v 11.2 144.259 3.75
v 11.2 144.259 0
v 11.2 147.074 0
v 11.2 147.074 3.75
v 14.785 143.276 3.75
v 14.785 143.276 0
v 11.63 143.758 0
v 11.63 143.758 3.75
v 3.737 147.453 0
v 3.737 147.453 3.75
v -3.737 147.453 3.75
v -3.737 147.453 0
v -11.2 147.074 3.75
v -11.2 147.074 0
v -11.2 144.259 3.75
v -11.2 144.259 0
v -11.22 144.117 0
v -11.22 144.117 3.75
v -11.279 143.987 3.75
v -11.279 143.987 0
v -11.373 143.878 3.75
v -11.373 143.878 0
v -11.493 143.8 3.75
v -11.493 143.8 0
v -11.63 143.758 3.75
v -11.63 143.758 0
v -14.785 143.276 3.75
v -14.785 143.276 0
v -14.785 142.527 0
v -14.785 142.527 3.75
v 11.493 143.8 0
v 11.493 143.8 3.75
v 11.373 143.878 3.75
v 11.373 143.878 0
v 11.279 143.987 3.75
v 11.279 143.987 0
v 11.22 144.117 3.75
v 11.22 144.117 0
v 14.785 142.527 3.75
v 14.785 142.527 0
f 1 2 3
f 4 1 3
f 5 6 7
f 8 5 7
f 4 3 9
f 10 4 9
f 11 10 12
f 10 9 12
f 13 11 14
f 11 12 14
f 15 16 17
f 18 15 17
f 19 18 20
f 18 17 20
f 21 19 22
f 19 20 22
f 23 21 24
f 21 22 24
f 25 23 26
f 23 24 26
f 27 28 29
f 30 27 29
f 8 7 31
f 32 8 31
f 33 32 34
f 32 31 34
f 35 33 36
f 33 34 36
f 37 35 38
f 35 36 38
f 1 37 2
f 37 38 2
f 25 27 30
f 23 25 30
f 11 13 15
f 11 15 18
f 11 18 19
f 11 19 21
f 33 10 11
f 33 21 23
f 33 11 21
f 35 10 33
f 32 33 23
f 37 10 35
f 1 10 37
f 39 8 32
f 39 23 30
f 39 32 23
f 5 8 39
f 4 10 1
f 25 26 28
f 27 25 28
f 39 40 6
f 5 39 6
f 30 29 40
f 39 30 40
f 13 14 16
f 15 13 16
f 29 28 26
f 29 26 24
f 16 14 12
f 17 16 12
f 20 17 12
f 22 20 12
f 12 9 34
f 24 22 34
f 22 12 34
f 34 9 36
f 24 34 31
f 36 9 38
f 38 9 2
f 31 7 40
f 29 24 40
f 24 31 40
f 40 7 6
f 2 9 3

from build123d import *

# Parameters (mm, degrees)
F1_DEPTH = 3.75


# Not quite as in the source:
# - a feature of the source that left no trace in its solid (it failed there, or was rolled back) is left out


with BuildPart() as f1:
    # F0 (on Top) → F1 (new body)
    with BuildSketch(Plane.XY):
        with BuildLine():
            Line((11.2, 144.2591021933), (11.2, 147.0741649645))
            ThreePointArc((11.2, 147.0741649645), (0, 147.5), (-11.2, 147.0741649645))
            Line((-11.2, 147.0741649645), (-11.2, 144.2591021933))
            ThreePointArc((-11.2, 144.2591021933), (-11.3222315822, 143.9291191636), (-11.6299352058, 143.7583917795))
            Line((-11.6299352058, 143.7583917795), (-14.7849675268, 143.2757224802))
            Line((-14.7849675268, 143.2757224802), (-14.7849675268, 142.5268018024))
            Line((-14.7849675268, 142.5268018024), (-11.2, 142.5268018024))
            Line((-11.2, 142.5268018024), (11.2, 142.5268018024))
            Line((11.2, 142.5268018024), (14.7849675268, 142.5268018024))
            Line((14.7849675268, 142.5268018024), (14.7849675268, 143.2757224802))
            Line((14.7849675268, 143.2757224802), (11.6299352058, 143.7583917795))
            ThreePointArc((11.6299352058, 143.7583917795), (11.3222315822, 143.9291191636), (11.2, 144.2591021933))
        make_face()
    extrude(amount=F1_DEPTH)


solid = f1.part
